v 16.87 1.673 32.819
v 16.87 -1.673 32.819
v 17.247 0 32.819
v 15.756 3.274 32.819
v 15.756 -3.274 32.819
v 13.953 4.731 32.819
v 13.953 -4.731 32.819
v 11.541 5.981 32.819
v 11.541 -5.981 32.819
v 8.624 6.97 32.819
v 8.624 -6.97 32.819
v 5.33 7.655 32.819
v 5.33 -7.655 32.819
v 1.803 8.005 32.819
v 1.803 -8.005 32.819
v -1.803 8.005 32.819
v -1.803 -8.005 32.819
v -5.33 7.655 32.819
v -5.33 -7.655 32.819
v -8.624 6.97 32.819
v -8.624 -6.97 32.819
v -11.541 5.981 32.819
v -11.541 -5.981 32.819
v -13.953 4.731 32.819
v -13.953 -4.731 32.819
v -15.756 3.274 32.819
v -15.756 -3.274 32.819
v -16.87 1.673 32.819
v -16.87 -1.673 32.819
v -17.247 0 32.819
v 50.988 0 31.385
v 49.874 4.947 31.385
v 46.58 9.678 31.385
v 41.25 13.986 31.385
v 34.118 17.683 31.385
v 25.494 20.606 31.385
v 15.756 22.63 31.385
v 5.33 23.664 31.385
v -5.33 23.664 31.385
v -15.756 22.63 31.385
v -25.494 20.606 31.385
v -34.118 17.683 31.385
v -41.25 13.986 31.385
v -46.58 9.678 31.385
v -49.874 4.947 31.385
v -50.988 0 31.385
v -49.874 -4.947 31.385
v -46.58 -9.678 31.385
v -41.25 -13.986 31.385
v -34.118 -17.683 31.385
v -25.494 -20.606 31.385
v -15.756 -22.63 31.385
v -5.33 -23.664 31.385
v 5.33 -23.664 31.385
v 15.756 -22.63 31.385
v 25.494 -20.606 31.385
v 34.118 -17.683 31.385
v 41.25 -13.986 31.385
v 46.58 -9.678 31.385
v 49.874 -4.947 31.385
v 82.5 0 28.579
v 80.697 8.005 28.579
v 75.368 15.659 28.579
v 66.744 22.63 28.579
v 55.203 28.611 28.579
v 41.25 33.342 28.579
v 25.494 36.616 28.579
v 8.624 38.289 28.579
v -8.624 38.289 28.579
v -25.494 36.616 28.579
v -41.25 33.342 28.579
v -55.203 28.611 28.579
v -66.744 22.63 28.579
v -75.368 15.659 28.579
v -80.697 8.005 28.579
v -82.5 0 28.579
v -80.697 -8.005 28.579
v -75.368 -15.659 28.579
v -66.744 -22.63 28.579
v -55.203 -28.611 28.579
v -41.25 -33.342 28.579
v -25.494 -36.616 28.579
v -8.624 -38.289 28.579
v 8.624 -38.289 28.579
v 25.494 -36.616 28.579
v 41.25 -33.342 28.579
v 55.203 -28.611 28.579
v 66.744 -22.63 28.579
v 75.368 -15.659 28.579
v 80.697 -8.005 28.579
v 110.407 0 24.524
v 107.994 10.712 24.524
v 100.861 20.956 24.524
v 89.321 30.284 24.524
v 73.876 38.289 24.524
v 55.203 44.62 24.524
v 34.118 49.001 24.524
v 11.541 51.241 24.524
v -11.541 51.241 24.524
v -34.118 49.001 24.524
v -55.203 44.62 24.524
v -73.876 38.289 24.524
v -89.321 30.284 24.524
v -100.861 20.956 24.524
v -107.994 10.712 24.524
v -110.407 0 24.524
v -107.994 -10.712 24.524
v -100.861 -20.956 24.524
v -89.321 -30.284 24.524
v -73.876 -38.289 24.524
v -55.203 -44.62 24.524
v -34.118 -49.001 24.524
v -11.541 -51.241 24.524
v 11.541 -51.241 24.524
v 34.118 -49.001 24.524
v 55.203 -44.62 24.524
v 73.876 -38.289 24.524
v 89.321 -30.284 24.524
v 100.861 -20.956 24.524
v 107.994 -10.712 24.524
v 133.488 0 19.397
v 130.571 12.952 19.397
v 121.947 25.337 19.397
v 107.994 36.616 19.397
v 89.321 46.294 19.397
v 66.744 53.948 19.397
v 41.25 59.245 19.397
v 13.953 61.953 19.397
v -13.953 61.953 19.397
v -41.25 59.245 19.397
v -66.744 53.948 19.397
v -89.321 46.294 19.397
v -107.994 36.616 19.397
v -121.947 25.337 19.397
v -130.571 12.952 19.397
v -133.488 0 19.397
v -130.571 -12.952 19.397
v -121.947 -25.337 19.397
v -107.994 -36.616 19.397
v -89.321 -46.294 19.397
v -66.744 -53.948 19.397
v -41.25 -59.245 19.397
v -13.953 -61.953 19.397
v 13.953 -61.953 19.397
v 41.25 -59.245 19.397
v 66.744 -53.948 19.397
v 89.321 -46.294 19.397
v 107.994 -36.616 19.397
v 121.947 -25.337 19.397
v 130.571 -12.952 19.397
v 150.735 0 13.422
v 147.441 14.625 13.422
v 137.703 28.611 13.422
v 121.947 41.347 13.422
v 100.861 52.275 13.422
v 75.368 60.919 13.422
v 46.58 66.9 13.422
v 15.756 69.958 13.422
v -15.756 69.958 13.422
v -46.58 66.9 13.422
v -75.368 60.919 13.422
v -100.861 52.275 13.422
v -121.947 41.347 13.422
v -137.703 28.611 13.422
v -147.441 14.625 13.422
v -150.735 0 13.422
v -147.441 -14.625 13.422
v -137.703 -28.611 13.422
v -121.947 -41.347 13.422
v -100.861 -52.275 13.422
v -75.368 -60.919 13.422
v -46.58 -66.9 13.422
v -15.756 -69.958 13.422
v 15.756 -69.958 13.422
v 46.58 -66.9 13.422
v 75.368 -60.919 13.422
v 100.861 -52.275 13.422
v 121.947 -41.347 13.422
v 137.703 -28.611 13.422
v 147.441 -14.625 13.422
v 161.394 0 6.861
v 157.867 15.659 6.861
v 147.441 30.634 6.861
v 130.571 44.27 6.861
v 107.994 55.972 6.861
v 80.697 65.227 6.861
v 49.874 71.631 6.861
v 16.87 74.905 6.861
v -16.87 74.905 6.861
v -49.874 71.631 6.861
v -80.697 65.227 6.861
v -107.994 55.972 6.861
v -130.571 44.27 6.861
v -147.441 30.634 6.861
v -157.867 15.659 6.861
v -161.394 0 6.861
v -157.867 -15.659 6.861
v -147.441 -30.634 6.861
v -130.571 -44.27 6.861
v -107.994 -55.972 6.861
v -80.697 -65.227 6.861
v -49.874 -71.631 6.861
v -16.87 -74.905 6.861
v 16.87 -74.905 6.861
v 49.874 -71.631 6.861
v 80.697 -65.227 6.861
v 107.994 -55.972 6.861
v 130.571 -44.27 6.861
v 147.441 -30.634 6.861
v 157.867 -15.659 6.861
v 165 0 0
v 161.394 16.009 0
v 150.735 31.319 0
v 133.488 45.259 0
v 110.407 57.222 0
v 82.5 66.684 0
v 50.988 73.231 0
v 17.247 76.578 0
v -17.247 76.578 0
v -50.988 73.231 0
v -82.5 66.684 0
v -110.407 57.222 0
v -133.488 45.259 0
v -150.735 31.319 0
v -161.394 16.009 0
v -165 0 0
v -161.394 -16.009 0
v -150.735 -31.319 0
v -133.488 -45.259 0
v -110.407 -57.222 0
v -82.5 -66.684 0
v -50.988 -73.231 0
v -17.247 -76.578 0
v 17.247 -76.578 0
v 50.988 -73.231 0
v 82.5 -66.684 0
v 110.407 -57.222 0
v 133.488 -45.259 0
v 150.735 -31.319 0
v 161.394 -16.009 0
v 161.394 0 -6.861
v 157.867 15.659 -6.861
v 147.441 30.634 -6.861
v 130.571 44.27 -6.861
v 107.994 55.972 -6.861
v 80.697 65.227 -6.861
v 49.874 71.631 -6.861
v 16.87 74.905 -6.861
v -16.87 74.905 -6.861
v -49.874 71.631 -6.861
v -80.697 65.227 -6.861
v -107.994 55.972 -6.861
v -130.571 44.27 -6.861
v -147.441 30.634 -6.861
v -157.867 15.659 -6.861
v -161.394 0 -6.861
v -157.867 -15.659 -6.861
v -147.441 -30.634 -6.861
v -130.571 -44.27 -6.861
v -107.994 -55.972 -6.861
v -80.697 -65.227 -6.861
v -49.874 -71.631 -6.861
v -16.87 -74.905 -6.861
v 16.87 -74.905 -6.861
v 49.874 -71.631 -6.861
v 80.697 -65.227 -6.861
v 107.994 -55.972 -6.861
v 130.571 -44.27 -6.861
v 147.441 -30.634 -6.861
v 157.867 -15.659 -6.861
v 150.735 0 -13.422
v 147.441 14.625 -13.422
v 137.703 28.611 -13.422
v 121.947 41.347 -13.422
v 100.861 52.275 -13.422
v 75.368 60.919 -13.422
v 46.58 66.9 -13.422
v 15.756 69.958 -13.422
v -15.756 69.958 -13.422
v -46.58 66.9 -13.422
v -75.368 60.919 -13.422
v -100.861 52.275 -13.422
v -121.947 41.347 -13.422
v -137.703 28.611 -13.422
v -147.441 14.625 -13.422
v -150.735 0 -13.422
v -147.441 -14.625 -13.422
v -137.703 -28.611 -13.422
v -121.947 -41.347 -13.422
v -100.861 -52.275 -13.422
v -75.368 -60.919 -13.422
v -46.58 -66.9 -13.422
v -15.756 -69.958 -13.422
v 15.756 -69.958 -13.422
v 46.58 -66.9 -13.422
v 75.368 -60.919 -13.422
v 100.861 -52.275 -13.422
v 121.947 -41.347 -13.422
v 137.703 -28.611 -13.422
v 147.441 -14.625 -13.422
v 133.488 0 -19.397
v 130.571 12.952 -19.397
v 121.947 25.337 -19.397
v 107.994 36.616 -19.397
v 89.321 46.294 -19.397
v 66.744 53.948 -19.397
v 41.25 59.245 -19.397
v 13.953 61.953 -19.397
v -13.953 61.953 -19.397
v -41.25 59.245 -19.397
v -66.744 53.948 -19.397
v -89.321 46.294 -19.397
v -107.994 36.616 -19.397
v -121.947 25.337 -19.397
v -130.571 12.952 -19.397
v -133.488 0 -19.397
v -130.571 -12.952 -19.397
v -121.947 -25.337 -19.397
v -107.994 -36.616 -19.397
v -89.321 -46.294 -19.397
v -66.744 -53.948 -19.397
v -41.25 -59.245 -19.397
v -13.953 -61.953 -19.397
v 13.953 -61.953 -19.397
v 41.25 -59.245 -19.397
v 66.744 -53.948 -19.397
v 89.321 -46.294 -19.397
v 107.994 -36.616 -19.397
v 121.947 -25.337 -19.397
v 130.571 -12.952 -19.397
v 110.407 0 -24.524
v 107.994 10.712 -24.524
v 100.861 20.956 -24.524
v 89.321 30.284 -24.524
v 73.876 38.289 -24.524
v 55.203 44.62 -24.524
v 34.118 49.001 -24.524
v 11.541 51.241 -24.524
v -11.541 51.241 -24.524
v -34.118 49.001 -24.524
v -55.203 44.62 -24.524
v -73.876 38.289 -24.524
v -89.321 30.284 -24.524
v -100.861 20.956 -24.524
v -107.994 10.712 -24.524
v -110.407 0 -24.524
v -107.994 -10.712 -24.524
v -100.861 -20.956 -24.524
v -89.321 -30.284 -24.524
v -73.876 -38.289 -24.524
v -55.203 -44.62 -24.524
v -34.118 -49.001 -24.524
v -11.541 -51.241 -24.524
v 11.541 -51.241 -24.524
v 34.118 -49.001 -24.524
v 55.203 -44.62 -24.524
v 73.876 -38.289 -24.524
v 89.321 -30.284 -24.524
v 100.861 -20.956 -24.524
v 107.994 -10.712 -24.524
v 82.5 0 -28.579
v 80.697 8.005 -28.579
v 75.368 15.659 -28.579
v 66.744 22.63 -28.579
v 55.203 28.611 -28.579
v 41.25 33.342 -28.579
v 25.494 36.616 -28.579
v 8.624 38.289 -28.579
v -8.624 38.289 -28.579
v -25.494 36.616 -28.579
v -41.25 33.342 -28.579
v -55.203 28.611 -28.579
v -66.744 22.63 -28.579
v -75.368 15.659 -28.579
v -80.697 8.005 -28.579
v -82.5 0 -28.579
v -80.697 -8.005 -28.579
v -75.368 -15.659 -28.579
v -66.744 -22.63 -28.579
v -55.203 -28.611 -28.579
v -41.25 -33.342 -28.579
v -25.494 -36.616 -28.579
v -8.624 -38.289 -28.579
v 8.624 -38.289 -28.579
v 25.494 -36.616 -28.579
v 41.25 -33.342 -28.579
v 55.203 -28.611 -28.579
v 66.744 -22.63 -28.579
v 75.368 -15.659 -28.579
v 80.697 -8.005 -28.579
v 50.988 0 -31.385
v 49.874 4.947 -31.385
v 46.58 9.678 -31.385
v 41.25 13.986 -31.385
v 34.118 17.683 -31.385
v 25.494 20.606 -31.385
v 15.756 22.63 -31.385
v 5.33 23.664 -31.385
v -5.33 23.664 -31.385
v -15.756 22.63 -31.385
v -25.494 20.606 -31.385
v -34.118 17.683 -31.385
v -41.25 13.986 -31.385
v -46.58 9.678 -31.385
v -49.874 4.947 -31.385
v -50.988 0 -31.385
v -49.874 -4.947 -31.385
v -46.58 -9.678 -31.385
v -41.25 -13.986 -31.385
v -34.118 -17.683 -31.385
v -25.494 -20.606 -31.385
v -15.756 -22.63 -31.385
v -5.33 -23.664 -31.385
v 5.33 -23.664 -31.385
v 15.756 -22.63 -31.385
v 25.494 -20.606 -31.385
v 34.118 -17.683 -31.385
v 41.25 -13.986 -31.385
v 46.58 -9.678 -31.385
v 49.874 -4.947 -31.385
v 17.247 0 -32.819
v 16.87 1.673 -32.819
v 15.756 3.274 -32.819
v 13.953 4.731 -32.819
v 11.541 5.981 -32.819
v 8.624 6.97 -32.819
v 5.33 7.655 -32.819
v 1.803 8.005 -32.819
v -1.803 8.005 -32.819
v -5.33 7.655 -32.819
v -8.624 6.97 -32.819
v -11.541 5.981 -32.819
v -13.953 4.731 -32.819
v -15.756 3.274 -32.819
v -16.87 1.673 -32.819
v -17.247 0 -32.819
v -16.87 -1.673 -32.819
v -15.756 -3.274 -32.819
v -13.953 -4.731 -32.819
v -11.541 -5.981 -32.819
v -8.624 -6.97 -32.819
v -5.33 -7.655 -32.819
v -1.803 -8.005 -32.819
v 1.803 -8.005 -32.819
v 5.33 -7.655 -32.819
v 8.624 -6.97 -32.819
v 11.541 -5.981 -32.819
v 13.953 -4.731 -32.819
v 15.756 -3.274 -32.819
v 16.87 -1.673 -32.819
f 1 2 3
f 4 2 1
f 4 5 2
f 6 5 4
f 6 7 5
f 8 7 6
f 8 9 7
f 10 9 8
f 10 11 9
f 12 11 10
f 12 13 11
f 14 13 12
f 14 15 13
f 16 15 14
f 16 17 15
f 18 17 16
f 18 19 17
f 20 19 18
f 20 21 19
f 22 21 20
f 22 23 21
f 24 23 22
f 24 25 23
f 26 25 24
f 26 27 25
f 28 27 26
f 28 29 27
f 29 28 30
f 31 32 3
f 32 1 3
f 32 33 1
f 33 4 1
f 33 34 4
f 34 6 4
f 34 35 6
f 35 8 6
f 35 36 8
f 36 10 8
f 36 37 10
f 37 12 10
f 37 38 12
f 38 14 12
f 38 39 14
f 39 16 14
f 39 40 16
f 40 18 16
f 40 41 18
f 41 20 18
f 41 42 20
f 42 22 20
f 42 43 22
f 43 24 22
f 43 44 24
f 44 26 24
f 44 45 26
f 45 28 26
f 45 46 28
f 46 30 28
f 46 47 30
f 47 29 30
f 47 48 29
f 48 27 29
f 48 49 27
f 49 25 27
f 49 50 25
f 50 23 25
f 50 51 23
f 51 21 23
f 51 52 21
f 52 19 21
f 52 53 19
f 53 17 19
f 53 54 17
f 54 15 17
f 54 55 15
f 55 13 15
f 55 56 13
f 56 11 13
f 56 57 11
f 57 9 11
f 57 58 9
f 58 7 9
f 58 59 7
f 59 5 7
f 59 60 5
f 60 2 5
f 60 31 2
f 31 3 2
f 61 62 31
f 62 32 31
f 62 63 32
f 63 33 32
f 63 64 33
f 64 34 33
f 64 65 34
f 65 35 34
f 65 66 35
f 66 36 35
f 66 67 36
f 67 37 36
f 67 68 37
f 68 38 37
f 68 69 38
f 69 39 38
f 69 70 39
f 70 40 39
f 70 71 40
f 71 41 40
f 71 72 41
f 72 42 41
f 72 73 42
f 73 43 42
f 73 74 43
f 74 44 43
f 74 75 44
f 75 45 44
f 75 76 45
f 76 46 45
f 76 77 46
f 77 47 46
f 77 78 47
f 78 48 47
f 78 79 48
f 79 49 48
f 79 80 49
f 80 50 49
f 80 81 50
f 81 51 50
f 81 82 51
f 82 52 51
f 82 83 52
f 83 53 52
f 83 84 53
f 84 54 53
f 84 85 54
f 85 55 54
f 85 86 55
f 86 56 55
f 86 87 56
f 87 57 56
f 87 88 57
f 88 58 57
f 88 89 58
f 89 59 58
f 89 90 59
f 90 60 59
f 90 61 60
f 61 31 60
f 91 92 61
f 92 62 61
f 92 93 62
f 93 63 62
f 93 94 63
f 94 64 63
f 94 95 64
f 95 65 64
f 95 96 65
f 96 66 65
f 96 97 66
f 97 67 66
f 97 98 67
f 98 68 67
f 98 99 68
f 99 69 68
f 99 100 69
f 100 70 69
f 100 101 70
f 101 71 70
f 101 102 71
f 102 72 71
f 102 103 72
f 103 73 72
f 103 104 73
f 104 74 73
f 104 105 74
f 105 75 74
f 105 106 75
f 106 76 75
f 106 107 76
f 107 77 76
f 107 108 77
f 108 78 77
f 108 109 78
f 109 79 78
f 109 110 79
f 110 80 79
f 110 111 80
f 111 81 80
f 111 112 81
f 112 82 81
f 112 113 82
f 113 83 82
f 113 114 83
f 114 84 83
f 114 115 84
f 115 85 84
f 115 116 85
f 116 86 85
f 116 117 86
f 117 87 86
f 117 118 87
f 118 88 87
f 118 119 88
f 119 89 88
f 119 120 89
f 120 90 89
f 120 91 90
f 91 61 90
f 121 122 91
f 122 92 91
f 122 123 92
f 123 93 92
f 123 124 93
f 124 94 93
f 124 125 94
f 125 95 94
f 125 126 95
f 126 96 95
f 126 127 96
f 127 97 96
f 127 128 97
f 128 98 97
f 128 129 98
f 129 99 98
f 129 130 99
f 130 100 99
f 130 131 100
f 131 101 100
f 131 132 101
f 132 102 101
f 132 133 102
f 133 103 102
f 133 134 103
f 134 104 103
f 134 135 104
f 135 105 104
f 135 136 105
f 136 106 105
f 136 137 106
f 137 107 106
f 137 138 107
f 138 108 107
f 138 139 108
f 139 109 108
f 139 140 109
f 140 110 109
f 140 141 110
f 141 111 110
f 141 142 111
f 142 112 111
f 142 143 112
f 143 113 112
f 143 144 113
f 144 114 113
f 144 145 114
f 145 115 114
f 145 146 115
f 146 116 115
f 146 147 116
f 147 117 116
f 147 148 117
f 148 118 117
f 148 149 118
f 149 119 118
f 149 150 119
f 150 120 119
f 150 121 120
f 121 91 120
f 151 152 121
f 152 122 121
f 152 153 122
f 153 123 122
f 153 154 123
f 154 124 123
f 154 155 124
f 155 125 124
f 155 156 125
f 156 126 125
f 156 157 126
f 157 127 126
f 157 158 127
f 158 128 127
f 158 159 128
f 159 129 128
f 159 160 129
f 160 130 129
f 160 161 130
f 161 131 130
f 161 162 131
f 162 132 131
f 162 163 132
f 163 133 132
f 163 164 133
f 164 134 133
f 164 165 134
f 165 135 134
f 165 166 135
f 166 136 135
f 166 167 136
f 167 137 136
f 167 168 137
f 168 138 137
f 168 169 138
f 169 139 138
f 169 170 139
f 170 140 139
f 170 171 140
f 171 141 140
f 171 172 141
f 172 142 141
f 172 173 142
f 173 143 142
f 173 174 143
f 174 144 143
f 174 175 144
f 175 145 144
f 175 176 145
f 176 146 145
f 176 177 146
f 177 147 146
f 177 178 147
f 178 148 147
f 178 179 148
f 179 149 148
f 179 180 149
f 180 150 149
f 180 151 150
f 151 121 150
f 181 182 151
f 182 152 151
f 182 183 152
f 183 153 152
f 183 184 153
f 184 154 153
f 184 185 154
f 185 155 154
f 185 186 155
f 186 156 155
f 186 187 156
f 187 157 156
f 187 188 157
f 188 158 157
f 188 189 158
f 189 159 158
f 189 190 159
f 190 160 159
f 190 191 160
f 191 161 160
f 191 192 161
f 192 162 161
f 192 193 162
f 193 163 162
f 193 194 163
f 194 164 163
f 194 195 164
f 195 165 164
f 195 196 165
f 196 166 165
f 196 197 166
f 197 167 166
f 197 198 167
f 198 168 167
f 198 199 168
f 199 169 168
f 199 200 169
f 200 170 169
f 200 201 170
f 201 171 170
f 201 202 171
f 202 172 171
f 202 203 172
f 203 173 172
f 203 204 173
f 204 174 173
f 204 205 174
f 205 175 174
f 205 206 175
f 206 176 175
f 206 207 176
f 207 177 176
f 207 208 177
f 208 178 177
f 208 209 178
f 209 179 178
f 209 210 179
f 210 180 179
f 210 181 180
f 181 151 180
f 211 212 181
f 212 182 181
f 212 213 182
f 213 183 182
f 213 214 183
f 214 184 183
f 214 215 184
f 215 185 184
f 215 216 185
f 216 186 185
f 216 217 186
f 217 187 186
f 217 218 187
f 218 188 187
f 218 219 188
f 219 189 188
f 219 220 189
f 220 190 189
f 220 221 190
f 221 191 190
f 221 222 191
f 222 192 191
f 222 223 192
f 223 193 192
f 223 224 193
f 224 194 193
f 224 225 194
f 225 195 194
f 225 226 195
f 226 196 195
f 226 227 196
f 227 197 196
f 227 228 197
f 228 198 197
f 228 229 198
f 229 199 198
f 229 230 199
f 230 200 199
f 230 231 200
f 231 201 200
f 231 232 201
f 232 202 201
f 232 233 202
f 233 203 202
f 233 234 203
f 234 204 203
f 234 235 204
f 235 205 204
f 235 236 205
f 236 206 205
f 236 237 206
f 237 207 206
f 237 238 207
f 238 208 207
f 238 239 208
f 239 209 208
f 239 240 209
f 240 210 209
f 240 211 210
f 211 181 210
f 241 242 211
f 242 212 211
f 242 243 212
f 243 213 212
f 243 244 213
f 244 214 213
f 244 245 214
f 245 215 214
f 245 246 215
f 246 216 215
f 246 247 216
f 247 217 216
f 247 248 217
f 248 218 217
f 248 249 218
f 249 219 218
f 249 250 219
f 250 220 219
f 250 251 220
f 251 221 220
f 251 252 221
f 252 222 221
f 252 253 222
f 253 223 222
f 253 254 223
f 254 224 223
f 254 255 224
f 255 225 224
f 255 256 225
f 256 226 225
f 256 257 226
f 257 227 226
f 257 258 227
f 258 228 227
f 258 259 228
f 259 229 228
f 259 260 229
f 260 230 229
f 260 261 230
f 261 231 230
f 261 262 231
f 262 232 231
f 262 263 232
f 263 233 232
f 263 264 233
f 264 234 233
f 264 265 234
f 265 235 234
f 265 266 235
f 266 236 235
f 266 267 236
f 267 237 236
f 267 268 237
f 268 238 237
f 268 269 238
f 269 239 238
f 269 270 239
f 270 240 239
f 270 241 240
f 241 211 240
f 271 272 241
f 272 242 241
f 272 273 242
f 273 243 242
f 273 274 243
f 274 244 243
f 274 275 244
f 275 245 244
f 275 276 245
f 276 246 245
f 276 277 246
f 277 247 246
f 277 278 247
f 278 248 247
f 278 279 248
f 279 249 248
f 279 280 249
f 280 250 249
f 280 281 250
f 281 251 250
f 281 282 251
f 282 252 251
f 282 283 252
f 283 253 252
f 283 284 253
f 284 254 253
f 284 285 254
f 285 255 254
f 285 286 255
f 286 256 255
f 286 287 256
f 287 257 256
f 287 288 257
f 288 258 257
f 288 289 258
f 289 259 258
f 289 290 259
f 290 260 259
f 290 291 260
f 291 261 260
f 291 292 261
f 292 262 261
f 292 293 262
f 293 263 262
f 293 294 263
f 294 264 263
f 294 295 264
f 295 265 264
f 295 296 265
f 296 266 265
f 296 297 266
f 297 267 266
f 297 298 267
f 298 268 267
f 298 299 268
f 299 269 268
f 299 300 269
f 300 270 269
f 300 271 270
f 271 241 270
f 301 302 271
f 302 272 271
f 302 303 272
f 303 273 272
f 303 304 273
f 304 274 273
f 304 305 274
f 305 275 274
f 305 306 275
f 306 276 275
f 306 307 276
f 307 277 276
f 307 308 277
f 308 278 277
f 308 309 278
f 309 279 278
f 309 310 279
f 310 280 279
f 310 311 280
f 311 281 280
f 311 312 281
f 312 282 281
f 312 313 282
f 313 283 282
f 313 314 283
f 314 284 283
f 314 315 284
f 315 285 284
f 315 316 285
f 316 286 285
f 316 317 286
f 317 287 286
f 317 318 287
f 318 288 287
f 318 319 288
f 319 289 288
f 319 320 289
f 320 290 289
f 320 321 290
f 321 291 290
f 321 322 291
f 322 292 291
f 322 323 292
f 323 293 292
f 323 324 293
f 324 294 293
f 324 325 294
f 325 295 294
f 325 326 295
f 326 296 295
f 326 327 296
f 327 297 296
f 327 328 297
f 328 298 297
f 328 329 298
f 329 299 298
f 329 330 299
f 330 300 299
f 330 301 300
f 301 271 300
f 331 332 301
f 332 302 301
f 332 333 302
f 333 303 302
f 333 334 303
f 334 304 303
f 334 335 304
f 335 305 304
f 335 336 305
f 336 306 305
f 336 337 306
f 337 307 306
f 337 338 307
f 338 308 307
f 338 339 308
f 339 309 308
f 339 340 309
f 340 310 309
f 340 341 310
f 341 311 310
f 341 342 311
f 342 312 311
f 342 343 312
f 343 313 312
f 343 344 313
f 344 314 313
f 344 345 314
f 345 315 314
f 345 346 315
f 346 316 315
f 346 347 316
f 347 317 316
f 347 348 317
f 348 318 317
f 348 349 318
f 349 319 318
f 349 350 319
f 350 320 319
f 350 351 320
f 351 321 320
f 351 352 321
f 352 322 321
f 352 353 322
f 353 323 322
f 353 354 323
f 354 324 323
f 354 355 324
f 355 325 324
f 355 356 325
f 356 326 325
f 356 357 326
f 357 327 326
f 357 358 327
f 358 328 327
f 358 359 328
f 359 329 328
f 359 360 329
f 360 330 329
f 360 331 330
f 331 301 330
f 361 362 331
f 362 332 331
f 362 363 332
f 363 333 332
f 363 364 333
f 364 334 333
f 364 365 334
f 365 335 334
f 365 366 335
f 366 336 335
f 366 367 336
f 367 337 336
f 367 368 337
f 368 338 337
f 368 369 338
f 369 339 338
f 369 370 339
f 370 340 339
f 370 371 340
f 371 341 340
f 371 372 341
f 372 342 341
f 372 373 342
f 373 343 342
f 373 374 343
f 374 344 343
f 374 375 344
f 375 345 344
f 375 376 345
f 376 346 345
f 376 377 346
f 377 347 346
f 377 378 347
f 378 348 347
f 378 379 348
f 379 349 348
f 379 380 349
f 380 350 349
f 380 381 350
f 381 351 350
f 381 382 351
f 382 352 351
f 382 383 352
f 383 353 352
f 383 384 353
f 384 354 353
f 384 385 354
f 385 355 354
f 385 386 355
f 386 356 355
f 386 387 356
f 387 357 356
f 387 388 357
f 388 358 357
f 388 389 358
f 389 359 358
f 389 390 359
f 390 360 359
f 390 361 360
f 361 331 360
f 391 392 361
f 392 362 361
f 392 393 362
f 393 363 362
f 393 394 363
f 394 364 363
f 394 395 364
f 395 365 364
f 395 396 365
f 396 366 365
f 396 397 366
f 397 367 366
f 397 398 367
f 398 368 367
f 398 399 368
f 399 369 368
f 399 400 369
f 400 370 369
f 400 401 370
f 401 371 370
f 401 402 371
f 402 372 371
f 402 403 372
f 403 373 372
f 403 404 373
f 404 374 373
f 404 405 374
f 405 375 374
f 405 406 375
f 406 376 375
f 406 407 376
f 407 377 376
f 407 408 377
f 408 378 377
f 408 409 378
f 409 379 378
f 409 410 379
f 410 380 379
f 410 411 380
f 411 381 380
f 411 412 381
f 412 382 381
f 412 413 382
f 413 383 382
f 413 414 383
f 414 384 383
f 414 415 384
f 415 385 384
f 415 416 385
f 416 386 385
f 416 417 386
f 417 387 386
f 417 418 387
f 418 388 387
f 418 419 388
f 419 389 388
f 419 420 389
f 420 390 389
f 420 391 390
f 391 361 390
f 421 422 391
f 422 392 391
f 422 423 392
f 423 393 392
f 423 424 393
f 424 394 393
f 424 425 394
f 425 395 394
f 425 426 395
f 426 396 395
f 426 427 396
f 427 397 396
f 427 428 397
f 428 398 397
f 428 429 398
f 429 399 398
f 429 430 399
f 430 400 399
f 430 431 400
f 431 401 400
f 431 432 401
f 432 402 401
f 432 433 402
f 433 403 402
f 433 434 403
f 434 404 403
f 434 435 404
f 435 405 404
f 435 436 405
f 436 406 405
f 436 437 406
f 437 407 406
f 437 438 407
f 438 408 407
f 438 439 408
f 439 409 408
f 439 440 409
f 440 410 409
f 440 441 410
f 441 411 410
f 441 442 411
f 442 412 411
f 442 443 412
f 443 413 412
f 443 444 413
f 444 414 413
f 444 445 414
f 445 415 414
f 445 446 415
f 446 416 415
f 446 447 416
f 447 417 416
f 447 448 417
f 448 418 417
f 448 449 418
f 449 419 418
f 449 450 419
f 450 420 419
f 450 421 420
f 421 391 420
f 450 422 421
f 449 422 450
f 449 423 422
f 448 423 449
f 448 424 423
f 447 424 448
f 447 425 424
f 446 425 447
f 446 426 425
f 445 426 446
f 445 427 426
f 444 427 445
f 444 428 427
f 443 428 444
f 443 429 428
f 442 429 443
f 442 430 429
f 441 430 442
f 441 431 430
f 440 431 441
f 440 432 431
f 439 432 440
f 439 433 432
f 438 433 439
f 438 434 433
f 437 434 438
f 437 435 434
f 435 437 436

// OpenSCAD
// Generated by SolidPython 1.0.1 on 2020-07-29 00:46:51


scale(v = [15, 7, 3]) {
	sphere(r = 11);
}
/***********************************************
*********      SolidPython code:      **********
************************************************
 
# import packages: SolidPython
from solid import *
from solid.utils import *
from itertools import chain, combinations, permutations


class Resize:

    def __init__(self, scad_file):
        self.scad_file = scad_file
        #self.scad_file = import_scad(scad_file)
        # cone/cylinder param:
        self.r1 = 0
        self.r2 = 0
        self.h = 0
        # rectangular prism param:
        self.w = 0
        self.l = 0
        # ellipse param:
        self.r = 0

    # import OpenScad code (file name corresponds to shape)


    # classify shape + parameters
    def assign(self, param1, param2, param3):
        if self.scad_file == 'cone.scad':
            self.r1 = param1
            self.r2 = param2
            self.h = param3
        elif self.scad_file == 'cylinder.scad':
            self.r1 = param1
            self.r2 = param2
            self.h = param3
        elif self.scad_file == 'rectangularPrism.scad':
            self.h = param1
            self.l = param2
            self.w = param3
        else:
            self.r = param1
            self.h = param2

    # resize parameters
    def iterate(self):
        x = range(3, 20, 2)
        i = 1
        if self.scad_file == 'cone.scad':
            tempList = list(permutations(x, 2))
            for temp in tempList:
                param1 = temp[0]
                param2 = temp[1]
                filepath = 'produced_scad_files/' + 'cone' + str(param1) + '_' + str(param2) + '_' + '.scad'
                scad_render_to_file(cylinder(h=param1, r1=param2, r2=0), filepath)

        elif self.scad_file == 'cylinder.scad':
            tempList = list(permutations(x, 3))
            for temp in tempList:
                param1 = temp[0]
                param2 = temp[1]
                filepath = 'produced_scad_files/' + 'cylinder' + str(param1) + '_' + str(param2) + '_' + '.scad'
                scad_render_to_file(cylinder(h=param1, r1=param2, r2=param2), filepath)

        elif self.scad_file == 'rectangularPrism.scad':
            tempList = list(permutations(x, 3))
            for temp in tempList:
                param1 = temp[0]
                param2 = temp[1]
                param3 = temp[2]
                filepath = 'produced_scad_files/' + 'rectangularPrism' + str(param1) + '_' + str(param2) + '_' + str(
                    param3) + '.scad'
                scad_render_to_file(cube(size=(param1, param2, param3)), filepath)

        elif self.scad_file == 'ellipse.scad':
            tempList = list(permutations(x, 4))
            for temp in tempList:
                param1 = temp[0]
                param2 = temp[1]
                param3 = temp[2]
                param4 = temp[3]
                filepath = 'produced_scad_files/' + 'ellipse' + str(param1) + '_' + str(param2) + '_' + str(param3) + '_' + str(param4) + '.scad'
                scad_render_to_file(scale([param1, param2, param3])(sphere(r=param4)), filepath)

    def render_to_scadfile(self):
        scad_render_to_file(scad, 'example.scad') 
 
************************************************/
